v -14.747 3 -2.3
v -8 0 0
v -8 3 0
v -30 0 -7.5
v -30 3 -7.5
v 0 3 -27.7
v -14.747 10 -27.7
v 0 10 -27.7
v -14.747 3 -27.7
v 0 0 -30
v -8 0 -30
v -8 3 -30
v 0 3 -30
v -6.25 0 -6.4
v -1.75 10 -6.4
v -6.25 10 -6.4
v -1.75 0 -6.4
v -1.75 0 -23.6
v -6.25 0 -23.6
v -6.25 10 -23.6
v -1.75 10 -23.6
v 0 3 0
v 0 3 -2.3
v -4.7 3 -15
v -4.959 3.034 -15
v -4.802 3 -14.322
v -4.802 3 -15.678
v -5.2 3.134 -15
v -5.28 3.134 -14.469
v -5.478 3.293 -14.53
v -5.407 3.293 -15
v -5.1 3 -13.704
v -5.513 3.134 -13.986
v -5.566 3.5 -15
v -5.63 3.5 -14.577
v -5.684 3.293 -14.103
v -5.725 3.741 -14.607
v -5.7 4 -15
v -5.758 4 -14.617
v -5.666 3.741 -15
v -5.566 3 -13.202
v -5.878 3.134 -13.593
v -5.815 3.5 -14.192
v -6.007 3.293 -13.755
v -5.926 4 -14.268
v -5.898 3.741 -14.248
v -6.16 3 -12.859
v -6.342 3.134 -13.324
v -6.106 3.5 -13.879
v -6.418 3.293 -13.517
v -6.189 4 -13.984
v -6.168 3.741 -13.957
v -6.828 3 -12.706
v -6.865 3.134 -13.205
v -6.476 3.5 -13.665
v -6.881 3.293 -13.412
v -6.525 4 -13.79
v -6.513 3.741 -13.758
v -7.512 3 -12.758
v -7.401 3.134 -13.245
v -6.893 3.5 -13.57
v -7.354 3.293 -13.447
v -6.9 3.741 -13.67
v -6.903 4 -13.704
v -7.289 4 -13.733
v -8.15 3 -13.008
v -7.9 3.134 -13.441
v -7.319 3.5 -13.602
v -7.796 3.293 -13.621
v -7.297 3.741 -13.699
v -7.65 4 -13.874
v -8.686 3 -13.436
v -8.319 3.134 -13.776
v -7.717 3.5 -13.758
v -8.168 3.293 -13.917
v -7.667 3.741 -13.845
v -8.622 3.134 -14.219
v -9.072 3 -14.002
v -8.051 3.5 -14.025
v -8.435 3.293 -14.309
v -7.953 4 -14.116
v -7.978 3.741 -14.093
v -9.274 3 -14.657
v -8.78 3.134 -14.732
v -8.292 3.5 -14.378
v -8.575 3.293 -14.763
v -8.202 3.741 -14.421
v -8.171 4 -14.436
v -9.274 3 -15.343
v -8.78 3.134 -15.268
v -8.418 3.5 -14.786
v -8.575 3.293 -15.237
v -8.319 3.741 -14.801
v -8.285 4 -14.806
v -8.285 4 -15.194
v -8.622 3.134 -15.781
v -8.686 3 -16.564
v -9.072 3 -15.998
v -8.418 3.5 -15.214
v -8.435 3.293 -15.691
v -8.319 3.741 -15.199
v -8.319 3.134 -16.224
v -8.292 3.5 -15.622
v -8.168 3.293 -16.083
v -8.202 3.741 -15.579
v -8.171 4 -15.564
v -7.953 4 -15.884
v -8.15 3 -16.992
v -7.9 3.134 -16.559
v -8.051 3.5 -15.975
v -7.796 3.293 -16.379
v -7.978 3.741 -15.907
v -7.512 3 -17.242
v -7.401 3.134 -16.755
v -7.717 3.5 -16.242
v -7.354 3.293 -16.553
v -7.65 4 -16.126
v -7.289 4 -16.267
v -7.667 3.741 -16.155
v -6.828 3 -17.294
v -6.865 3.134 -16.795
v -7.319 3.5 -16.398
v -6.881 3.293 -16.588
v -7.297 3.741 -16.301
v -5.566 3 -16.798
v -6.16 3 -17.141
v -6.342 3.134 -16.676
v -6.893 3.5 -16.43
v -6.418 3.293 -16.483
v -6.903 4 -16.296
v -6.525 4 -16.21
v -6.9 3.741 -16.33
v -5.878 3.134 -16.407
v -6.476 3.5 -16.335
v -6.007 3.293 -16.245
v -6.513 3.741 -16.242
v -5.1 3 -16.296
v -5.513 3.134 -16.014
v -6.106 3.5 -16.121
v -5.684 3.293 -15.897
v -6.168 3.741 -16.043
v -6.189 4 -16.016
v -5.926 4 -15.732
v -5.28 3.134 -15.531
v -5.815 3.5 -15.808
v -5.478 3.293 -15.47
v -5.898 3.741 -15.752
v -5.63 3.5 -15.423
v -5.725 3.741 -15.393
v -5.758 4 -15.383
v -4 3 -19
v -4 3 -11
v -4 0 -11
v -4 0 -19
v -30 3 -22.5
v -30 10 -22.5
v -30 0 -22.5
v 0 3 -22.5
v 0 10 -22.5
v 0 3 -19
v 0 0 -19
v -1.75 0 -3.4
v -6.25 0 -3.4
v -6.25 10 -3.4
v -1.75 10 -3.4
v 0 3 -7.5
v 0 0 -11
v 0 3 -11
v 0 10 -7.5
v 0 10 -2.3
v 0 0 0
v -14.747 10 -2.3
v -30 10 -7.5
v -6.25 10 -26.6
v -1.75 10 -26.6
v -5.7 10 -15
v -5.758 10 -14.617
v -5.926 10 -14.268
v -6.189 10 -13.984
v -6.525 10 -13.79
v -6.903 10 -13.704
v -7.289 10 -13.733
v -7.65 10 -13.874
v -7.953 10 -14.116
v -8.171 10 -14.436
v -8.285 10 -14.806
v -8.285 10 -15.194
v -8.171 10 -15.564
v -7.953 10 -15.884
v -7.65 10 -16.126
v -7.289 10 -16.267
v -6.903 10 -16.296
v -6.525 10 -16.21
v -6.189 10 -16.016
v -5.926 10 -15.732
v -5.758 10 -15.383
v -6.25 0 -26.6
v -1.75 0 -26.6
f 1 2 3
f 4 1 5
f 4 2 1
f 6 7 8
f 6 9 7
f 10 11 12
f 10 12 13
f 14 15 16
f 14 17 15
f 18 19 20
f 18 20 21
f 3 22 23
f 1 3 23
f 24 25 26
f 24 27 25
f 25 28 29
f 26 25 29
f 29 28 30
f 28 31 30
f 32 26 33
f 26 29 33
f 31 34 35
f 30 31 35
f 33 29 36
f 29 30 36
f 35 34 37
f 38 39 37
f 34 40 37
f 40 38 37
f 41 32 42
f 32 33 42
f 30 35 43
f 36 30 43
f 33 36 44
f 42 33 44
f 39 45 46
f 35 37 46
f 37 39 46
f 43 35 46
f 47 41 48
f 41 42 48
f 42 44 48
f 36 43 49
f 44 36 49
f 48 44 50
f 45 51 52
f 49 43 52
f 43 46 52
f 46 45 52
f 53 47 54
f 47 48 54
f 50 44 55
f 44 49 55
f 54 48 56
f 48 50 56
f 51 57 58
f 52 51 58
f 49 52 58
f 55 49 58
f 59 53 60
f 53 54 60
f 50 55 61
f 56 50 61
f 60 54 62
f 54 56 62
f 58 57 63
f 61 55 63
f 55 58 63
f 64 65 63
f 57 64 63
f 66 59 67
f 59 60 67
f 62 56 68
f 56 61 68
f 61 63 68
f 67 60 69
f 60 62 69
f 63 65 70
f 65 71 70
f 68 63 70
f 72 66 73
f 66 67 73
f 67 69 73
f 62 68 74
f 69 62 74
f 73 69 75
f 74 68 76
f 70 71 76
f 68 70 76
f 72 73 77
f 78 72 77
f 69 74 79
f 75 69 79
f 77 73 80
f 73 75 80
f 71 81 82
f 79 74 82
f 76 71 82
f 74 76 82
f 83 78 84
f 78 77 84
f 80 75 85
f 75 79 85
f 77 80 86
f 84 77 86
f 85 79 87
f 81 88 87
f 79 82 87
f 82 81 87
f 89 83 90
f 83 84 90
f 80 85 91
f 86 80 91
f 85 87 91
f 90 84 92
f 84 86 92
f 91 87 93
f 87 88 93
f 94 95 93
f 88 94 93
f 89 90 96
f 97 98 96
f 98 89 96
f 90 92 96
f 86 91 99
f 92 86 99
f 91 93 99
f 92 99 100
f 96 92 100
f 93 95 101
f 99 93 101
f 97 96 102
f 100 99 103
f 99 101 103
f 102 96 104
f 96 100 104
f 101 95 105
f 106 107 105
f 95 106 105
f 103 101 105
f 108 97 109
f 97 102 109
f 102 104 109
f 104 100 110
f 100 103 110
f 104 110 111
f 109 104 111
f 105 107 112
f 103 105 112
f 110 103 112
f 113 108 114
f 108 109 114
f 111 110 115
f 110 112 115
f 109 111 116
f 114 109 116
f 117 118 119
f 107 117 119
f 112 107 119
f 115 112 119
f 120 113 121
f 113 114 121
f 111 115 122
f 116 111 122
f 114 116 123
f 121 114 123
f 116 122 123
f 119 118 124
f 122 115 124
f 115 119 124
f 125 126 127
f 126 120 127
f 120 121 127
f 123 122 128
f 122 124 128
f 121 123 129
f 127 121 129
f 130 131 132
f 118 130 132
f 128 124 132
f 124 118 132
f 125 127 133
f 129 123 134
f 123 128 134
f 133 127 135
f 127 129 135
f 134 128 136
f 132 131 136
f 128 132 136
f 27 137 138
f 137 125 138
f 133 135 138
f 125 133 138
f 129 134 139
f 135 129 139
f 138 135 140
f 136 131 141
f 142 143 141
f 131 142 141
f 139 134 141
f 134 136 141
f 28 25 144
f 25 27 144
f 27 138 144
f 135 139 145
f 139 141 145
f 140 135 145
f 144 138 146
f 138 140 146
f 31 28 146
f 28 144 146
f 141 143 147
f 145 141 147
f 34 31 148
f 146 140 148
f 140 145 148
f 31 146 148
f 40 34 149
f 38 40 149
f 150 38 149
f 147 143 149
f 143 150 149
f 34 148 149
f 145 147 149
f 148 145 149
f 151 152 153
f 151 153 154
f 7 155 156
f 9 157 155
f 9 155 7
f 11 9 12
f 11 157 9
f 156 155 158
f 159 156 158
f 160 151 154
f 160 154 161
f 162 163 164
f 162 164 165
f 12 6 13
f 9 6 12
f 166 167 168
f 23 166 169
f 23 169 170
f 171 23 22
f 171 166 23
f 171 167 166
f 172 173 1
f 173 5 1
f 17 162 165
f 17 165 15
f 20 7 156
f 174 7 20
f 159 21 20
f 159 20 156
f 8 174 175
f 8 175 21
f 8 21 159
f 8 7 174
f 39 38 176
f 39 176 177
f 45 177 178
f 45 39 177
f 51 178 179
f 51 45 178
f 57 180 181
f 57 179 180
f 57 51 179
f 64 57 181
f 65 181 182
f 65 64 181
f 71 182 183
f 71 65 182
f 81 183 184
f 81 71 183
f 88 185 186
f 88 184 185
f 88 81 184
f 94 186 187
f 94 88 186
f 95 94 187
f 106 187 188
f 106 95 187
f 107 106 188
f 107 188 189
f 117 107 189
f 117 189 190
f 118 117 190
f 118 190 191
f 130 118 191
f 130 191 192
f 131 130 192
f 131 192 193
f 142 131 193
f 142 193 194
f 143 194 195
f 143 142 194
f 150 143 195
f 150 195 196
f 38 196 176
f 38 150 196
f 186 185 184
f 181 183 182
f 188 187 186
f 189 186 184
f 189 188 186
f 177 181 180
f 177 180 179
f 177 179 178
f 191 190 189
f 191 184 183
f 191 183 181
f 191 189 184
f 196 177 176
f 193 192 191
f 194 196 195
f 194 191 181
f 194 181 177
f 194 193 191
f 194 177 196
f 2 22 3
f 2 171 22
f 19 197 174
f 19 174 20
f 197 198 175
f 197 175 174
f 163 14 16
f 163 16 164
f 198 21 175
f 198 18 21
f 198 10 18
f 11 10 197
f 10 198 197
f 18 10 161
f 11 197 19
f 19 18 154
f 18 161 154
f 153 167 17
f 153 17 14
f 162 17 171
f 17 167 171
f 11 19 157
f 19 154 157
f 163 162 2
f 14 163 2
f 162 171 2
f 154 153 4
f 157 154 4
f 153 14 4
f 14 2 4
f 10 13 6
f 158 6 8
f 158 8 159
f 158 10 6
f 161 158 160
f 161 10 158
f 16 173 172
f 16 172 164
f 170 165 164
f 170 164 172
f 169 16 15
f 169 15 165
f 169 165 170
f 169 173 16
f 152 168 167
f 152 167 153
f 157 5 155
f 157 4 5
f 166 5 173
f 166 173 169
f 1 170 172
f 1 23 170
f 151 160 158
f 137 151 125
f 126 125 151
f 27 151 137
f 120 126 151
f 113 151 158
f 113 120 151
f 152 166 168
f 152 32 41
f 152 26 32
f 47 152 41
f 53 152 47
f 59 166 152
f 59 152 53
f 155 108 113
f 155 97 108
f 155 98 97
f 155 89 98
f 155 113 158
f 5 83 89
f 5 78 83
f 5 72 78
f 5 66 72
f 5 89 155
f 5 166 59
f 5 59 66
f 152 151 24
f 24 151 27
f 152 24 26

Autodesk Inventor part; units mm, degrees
ref_plane "YZ Plane" through (0, 0, 0) normal (1, 0, 0) x (0, 1, 0)
ref_plane "XZ Plane" through (0, 0, 0) normal (0, 1, 0) x (-1, 0, 0)
ref_plane "XY Plane" through (0, 0, 0) normal (0, 0, 1) x (1, 0, 0)
sketch "Sketch1" plane through (0, 0, 0) normal (0, 1, 0) x (-1, 0, 0)
  line L0 (0, 0) -> (8, 0)
  line L1 (8, -30) -> (0, -30)
  line L2 (0, -30) -> (0, 0)
  line L3 (6.25, -3.4) -> (1.75, -3.4)
  line L4 (1.75, -3.4) -> (1.75, -6.4)
  line L5 (1.75, -6.4) -> (6.25, -6.4)
  line L6 (6.25, -6.4) -> (6.25, -3.4)
  line L7 (6.25, -23.6) -> (1.75, -23.6)
  line L8 (1.75, -23.6) -> (1.75, -26.6)
  line L9 (1.75, -26.6) -> (6.25, -26.6)
  line L10 (6.25, -26.6) -> (6.25, -23.6)
  line L11 (8, 0) -> (30, -7.5)
  line L12 (30, -7.5) -> (30, -22.5)
  line L13 (30, -22.5) -> (8, -30)
  dimension "d0" = 30
  dimension "d1" = 8
  dimension "d2" = 4.5
  dimension "d3" = 3
  dimension "d4" = 3
  dimension "d5" = 17.2
  dimension "d6" = 3.4
  dimension "d7" = 1.75
  dimension "d8" = 15
  dimension "d10" = 7.5
  dimension "d11" = 22
  dimension "d12" = 22
extrude "Extrusion1" add sketch "Sketch1" along normal blind 3
sketch "Sketch2" plane through (0, 3, 0) normal (0, 1, 0) x (1, 0, 0)
  circle A0 centre (-7, 15) radius 1.3
  line L0 (-30, 22.5) -> (-30, 7.5) projected
  line L1 (-30, 7.5) -> (0, 7.5)
  line L2 (-30, 22.5) -> (0, 22.5)
  line L3 (-30, 7.5) -> (-14.7467, 2.3)
  line L4 (-30, 7.5) -> (-8, 0) projected
  line L5 (0, 0) -> (0, 30) projected
  line L6 (0, 2.3) -> (0, 7.5)
  line L7 (0, 2.3) -> (-14.7467, 2.3)
  line L8 (-8, 30) -> (-30, 22.5) projected
  line L9 (-30, 22.5) -> (-14.7467, 27.7)
  line L10 (-14.7467, 27.7) -> (0, 27.7)
  line L11 (0, 27.7) -> (0, 22.5)
  line L12 (-8, 0) -> (0, 0) projected
  line L13 (-1.75, 3.4) -> (-6.25, 3.4) projected
  line L14 (-6.25, 26.6) -> (-1.75, 26.6) projected
  point P0 (0, 27.7)
  dimension "d17" = 2.6
  dimension "d21" = 1.1
  dimension "d22" = 1.1
  dimension "d23" = 15
  dimension "d24" = 7
extrude "Extrusion2" add sketch "Sketch2" along normal blind 7 contours A0 | L8 L10 L5 L2 | L1 L5 L7 L3
sketch "Sketch3" plane through (0, 0, 0) normal (0, -1, 0) x (1, 0, 0)
  line L0 (-1.75, -6.4) -> (-1.75, -3.4) projected
  line L1 (-1.75, -3.4) -> (-6.25, -3.4)
  line L2 (-6.25, -3.4) -> (-6.25, -6.4)
  line L3 (-6.25, -6.4) -> (-1.75, -6.4)
  line L4 (-1.75, -6.4) -> (-1.75, -3.4)
  line L5 (-1.75, -26.6) -> (-1.75, -23.6) projected
  line L6 (-6.25, -26.6) -> (-1.75, -26.6) projected
  line L7 (-1.75, -23.6) -> (-6.25, -23.6)
  line L8 (-6.25, -23.6) -> (-6.25, -26.6)
  line L9 (-6.25, -26.6) -> (-1.75, -26.6)
  line L10 (-1.75, -26.6) -> (-1.75, -23.6)
  point P0 (0, 0)
extrude "Extrusion3" cut sketch "Sketch3" against normal through all
sketch "Sketch4" plane through (0, 3, 0) normal (0, 1, 0) x (1, 0, 0)
  line L0 (0, 7.5) -> (0, 22.5) projected
  line L1 (0, 11) -> (-4, 11)
  line L2 (-4, 11) -> (-4, 19)
  line L3 (-4, 19) -> (0, 19)
  line L4 (0, 19) -> (0, 11)
  circle A0 centre (-7, 15) radius 1.3 projected
  line L5 (0, 7.5) -> (-30, 7.5) projected
  point P0 (0, 0)
  point P1 (0, 19)
  dimension "d29" = 3
  dimension "d30" = 8
  dimension "d31" = 3.5
extrude "Extrusion4" cut sketch "Sketch4" against normal through all contours L1 L2 L3 L0
fillet "Fillet1" radius 1 1 edges at (-8.3, 3, -15)
properties part number "IRMount"
